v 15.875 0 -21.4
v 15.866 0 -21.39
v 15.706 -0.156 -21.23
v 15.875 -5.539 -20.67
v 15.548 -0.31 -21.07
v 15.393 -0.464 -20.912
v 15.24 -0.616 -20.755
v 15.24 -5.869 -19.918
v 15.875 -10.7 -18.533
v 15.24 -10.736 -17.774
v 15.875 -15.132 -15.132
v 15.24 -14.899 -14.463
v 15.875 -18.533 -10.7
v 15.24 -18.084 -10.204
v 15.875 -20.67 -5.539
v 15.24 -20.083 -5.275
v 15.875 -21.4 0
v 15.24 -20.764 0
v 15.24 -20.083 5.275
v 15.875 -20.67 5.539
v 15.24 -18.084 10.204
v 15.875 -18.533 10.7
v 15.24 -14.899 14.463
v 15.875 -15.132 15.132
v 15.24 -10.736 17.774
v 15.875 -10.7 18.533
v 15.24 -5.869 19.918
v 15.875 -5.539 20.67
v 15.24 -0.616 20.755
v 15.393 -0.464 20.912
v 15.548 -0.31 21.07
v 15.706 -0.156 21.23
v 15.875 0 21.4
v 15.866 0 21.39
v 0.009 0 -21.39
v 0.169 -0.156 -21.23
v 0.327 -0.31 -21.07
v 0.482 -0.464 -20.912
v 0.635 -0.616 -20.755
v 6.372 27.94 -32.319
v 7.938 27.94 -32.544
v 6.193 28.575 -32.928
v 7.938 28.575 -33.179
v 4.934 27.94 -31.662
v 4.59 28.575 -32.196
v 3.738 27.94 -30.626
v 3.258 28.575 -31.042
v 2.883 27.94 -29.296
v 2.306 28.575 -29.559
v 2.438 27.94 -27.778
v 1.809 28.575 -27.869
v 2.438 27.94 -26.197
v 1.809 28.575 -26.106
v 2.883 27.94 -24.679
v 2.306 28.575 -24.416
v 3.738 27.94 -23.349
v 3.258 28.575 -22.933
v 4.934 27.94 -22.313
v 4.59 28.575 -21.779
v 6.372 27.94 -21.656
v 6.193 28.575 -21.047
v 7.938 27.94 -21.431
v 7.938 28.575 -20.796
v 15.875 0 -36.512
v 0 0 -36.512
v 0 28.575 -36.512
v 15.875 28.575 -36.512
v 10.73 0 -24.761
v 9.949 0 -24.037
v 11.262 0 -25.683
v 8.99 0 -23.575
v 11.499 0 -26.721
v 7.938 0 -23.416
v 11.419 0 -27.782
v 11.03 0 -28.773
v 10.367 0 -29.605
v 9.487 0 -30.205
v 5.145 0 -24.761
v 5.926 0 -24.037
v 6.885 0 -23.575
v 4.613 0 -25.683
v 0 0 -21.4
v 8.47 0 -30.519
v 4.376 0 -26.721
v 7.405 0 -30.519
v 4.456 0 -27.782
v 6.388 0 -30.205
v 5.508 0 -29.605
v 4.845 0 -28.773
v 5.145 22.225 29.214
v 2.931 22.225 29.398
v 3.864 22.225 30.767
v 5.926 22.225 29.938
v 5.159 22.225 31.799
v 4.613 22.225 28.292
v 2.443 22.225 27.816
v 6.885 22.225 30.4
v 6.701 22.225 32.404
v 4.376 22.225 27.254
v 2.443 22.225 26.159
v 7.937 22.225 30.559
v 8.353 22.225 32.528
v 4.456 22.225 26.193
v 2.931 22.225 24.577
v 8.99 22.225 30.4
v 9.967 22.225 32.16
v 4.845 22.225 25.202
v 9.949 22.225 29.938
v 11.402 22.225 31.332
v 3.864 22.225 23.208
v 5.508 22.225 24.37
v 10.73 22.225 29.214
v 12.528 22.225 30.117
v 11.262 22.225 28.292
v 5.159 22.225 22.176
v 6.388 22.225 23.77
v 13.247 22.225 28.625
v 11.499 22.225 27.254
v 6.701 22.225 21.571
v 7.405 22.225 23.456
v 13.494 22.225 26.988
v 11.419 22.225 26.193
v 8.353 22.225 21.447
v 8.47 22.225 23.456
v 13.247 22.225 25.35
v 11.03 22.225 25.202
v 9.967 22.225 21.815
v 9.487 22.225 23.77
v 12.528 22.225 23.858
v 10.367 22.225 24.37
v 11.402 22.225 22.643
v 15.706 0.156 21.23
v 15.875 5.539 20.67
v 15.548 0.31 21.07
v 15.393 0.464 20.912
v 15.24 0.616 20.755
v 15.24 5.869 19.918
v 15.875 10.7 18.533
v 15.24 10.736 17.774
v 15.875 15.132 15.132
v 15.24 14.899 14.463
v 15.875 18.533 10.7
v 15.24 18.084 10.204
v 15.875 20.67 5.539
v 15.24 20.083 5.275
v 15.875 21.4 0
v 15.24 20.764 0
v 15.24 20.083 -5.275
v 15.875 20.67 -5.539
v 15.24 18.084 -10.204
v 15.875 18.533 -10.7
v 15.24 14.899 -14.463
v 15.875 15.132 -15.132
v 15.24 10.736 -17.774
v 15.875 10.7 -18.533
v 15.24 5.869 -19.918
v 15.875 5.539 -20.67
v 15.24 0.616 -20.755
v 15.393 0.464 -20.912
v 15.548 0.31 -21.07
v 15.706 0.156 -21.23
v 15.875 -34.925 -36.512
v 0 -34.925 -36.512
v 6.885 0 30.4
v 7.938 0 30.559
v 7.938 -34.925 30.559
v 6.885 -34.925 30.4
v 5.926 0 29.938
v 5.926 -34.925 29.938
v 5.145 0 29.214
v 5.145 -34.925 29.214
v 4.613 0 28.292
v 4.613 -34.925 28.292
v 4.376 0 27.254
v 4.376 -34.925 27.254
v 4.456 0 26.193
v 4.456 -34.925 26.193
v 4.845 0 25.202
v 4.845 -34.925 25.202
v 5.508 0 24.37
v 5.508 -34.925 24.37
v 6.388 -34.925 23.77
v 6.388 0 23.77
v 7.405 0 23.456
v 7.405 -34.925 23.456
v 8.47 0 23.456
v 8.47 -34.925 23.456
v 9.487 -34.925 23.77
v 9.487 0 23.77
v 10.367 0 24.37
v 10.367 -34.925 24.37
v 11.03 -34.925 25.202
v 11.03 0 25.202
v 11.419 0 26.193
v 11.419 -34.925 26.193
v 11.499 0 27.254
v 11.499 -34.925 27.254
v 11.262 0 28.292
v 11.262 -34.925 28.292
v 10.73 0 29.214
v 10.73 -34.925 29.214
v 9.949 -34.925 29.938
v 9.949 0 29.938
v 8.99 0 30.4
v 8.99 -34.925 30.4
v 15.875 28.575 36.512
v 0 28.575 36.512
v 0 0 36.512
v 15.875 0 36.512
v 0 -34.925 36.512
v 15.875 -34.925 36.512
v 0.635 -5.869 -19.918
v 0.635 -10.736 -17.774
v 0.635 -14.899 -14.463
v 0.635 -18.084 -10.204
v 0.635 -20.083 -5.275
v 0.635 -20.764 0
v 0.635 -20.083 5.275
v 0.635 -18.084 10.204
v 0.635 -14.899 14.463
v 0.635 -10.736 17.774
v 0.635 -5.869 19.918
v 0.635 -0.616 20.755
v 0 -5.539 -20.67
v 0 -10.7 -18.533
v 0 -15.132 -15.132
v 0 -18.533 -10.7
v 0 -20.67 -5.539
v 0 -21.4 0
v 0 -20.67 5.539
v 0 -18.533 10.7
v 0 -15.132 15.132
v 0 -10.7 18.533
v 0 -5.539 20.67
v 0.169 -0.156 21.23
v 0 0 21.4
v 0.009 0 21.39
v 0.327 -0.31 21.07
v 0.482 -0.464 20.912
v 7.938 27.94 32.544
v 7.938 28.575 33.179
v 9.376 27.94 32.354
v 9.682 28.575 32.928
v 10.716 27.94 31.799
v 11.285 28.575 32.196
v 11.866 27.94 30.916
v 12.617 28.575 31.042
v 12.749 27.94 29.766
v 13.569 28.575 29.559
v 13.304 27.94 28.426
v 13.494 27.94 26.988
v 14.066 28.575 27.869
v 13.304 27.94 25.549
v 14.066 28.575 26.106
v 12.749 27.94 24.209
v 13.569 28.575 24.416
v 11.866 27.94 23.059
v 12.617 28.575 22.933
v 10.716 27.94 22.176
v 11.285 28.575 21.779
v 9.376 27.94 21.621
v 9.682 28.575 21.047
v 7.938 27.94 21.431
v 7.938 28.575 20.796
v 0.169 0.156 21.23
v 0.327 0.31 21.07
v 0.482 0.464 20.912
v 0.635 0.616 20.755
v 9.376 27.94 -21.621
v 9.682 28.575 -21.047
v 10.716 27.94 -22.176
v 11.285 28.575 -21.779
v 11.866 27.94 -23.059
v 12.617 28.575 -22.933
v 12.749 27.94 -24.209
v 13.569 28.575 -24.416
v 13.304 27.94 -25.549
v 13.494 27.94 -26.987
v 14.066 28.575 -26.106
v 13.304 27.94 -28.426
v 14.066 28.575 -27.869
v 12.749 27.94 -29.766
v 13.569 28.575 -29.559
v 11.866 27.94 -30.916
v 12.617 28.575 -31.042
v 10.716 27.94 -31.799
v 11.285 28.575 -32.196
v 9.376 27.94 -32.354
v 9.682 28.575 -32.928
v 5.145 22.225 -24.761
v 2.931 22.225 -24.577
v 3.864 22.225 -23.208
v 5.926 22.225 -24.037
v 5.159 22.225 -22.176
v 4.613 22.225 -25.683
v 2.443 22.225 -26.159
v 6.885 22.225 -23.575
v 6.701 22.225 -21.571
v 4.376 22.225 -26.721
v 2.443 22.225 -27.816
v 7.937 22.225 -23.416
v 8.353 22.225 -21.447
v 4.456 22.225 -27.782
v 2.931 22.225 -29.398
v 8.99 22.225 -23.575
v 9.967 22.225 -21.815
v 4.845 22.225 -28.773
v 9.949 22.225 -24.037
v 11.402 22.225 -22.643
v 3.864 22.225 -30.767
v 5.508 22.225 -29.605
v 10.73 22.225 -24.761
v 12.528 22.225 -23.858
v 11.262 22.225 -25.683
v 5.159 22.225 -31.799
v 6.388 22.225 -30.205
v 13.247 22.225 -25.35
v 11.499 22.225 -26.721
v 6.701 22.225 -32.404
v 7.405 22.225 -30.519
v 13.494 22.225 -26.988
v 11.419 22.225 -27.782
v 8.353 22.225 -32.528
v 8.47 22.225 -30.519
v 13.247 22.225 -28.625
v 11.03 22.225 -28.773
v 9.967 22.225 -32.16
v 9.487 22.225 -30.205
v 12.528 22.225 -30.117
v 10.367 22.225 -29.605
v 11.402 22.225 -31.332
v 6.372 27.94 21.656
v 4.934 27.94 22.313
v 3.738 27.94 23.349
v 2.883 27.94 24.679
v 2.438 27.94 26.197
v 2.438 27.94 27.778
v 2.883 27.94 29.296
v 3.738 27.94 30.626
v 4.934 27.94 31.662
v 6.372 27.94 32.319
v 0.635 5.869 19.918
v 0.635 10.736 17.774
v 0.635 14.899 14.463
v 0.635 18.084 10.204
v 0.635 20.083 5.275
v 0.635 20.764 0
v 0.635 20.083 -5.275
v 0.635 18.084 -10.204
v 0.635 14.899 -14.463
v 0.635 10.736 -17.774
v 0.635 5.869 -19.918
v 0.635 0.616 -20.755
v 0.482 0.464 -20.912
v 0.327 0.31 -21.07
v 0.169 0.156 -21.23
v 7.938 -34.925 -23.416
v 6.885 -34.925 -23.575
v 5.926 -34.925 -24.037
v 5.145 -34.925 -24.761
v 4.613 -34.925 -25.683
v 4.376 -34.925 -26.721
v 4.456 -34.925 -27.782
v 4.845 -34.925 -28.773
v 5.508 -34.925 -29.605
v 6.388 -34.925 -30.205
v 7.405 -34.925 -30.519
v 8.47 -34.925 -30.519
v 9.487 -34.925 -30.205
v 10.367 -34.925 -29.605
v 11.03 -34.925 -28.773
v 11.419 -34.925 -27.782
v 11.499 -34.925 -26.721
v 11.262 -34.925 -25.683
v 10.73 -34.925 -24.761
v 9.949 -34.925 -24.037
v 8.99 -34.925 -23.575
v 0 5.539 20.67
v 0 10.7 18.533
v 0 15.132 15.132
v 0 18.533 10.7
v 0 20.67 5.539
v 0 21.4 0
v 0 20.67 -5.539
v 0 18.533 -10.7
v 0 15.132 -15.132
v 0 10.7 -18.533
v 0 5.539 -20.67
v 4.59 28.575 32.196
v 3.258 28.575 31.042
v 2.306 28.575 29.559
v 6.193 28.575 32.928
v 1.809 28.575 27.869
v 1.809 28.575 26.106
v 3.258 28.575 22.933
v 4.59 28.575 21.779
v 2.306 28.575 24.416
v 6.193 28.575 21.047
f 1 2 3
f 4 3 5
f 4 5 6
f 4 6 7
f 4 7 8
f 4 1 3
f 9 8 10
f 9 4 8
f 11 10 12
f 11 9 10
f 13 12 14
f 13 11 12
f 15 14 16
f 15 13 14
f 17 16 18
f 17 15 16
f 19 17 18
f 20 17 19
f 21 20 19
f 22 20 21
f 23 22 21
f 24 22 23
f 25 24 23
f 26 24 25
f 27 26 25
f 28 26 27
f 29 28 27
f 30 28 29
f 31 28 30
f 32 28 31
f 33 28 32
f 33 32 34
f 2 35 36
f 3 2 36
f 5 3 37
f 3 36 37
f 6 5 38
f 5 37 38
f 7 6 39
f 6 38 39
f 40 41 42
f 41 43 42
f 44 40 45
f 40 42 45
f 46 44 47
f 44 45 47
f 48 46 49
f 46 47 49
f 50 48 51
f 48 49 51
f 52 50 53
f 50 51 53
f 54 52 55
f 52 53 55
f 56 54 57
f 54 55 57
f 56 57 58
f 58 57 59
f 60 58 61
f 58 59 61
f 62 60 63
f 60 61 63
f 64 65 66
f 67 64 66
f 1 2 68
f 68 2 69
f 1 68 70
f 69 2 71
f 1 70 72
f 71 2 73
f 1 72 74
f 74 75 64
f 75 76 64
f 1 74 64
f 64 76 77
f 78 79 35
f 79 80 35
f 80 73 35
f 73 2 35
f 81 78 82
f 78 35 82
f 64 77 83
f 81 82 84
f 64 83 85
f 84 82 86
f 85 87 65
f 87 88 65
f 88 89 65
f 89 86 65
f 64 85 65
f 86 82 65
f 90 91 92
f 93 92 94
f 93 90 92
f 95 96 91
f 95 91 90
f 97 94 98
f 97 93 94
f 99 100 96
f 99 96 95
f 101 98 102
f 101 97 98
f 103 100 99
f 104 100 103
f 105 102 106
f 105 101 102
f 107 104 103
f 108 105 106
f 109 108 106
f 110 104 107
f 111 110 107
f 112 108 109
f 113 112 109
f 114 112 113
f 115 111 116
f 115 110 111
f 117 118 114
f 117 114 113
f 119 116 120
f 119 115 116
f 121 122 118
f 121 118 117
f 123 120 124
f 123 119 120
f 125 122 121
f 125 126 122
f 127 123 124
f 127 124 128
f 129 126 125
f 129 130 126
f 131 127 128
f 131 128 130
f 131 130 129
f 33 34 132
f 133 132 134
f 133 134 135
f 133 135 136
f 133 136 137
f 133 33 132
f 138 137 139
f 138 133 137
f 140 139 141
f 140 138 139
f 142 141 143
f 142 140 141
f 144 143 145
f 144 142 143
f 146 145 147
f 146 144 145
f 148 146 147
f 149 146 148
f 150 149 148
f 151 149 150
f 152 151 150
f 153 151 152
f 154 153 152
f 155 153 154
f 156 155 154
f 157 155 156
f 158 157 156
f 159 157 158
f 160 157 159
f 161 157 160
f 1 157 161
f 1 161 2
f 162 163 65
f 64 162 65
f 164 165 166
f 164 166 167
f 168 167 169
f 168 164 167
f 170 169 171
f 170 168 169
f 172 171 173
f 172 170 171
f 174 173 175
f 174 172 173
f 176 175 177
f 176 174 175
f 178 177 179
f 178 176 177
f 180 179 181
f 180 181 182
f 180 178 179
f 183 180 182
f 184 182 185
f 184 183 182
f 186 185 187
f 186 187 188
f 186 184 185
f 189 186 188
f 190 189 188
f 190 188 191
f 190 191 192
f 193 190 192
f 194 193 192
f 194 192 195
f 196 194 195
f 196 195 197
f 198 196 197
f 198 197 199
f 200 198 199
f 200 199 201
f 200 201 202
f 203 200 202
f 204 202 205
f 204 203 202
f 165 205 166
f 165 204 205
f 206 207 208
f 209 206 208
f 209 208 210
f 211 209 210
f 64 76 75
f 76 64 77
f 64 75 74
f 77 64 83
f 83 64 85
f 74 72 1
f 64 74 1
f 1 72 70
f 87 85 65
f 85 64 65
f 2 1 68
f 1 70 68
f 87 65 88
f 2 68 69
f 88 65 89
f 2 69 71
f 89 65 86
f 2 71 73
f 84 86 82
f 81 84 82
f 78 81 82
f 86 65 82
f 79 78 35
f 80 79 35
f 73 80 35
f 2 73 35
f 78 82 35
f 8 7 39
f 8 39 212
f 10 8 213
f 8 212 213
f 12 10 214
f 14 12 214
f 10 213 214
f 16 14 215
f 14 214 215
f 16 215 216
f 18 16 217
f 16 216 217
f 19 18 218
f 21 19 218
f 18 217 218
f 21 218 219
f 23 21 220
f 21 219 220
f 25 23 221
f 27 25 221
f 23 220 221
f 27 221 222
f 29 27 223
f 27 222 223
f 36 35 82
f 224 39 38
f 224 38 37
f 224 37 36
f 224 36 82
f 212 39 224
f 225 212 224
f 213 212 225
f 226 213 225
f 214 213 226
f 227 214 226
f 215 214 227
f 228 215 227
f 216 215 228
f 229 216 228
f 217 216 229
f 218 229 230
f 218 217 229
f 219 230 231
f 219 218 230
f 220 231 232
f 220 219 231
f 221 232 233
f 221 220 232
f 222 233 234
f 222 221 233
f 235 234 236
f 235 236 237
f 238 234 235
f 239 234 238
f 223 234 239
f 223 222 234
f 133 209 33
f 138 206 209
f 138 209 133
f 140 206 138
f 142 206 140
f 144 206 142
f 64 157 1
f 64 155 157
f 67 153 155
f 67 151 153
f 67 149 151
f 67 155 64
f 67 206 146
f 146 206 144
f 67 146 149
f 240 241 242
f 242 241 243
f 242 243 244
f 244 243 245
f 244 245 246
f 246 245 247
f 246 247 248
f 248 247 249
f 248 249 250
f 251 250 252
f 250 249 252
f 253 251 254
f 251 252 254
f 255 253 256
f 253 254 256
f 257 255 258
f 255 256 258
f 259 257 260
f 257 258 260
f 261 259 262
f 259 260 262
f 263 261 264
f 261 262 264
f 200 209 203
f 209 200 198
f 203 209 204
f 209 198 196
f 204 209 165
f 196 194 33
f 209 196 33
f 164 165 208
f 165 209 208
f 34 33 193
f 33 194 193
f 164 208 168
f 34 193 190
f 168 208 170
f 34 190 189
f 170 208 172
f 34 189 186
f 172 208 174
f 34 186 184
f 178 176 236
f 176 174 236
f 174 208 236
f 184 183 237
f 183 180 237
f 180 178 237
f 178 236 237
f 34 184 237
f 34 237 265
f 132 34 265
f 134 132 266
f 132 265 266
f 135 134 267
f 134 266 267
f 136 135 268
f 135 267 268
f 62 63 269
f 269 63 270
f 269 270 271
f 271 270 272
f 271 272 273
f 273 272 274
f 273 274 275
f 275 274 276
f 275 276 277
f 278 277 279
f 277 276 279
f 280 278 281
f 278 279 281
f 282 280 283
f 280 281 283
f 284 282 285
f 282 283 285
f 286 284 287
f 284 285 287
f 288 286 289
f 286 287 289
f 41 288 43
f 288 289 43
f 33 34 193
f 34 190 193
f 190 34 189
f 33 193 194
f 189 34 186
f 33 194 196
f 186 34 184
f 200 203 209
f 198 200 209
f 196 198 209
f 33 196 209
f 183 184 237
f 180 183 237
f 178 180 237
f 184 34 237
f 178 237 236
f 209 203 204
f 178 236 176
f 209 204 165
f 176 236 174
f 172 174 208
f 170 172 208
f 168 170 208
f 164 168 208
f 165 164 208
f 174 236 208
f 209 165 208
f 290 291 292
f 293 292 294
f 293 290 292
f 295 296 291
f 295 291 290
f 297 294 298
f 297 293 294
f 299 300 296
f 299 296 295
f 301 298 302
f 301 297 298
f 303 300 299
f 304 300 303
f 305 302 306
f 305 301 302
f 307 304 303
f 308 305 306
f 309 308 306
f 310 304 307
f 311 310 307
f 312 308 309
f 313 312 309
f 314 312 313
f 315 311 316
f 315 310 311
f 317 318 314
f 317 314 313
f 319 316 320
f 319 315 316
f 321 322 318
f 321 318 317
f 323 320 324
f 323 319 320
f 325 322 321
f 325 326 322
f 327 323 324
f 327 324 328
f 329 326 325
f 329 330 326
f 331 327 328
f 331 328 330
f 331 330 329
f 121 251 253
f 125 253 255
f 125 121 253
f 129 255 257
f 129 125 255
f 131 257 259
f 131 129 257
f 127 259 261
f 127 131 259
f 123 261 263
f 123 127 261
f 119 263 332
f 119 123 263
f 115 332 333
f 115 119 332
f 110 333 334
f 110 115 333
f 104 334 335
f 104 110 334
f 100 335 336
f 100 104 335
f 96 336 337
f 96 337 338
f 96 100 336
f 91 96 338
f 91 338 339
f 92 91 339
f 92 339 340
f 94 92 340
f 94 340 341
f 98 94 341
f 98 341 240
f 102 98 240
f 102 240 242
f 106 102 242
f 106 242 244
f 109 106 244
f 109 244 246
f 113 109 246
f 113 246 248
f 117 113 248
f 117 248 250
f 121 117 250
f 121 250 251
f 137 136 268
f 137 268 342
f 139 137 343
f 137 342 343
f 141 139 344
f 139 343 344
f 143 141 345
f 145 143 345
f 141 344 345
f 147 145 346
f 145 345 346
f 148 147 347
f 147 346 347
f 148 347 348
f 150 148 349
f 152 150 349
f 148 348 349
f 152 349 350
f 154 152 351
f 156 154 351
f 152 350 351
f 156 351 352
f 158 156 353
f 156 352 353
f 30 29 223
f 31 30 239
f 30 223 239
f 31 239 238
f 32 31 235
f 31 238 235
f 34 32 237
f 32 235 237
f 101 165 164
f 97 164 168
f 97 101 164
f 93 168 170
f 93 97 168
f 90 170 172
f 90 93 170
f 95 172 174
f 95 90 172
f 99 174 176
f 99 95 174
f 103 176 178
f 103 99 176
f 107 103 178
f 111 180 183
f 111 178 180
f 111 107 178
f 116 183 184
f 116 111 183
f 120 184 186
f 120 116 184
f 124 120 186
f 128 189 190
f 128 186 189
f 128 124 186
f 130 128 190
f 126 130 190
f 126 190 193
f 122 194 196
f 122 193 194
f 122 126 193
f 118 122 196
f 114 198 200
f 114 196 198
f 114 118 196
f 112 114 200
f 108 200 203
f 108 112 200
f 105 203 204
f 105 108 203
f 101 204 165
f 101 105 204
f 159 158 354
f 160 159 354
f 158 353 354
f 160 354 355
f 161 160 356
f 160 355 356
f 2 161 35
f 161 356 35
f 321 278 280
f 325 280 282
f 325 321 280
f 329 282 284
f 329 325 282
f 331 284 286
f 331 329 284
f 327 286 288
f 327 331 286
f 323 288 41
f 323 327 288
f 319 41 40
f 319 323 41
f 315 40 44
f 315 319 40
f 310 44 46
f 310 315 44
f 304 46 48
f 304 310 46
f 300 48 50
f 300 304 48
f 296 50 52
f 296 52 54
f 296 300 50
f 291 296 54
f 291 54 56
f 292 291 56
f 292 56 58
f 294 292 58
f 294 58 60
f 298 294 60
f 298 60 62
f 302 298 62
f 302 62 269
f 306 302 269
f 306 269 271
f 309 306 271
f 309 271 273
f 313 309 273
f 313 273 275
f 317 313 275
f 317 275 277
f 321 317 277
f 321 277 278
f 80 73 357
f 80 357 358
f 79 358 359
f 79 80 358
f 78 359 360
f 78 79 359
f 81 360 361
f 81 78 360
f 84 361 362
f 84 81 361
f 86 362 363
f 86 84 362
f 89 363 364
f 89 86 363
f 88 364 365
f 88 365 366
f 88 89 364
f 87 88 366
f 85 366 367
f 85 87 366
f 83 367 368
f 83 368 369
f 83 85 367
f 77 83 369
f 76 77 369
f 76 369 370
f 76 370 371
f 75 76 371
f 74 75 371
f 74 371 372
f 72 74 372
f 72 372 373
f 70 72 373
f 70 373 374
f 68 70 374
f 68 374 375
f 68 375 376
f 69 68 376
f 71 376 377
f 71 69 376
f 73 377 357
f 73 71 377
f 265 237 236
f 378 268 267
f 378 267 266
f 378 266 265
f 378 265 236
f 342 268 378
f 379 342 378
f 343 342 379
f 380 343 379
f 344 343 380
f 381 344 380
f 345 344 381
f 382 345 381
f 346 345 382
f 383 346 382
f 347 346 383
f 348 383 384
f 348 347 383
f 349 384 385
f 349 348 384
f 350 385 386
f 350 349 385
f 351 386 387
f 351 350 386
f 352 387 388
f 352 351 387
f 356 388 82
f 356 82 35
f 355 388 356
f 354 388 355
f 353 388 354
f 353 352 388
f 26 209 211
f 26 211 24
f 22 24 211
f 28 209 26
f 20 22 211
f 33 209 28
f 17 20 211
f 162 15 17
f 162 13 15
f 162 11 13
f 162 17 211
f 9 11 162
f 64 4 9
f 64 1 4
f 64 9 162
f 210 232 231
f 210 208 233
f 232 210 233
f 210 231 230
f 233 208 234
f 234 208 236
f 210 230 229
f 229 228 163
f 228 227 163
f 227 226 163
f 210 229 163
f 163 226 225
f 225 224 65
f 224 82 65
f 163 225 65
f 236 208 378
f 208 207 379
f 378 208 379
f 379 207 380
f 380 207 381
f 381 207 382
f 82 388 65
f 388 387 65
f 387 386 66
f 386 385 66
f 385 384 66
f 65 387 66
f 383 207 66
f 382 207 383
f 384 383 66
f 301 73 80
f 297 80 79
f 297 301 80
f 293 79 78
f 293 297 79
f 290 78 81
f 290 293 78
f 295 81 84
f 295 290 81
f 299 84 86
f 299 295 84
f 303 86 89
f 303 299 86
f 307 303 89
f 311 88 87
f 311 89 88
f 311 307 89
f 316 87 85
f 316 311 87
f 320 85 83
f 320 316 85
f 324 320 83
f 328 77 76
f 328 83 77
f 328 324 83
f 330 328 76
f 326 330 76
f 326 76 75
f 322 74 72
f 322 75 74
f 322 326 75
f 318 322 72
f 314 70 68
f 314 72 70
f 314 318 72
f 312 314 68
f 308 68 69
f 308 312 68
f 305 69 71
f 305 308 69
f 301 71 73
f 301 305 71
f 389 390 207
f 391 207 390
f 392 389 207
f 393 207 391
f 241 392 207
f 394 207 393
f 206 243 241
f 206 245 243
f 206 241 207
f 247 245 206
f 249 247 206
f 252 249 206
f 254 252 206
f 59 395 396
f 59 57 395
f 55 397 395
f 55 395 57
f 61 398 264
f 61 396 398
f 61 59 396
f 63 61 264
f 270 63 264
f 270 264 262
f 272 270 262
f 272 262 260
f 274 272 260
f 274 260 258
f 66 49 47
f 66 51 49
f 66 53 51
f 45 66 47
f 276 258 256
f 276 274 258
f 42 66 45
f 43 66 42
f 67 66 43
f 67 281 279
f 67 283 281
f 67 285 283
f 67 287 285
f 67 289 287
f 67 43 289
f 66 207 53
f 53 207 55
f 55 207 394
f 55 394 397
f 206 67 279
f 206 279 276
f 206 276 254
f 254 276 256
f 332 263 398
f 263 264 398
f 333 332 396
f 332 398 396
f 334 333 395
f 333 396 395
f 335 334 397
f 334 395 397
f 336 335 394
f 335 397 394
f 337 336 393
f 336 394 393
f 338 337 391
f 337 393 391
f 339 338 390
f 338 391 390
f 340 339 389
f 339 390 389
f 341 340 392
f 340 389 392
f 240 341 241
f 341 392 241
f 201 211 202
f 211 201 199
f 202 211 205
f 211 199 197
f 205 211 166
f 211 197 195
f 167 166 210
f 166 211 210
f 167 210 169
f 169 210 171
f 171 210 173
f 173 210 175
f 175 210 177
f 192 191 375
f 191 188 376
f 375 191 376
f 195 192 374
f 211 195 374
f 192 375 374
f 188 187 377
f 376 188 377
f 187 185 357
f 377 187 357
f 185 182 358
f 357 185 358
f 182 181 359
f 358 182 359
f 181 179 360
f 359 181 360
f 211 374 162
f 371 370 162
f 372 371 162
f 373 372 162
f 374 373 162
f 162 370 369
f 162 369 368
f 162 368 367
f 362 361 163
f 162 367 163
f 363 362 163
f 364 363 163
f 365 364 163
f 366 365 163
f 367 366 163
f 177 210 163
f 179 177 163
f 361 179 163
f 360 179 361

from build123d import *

# Parameters (mm, degrees)
BOSS_EXTRUDE1_DEPTH                           = 15.875
BOSS_EXTRUDE2_DEPTH                           = 15.875
CBORE_FOR_1_4_SOCKET_HEAD_CAP_SCREW1_AT_COUNT = 2
CBORE_FOR_1_4_SOCKET_HEAD_CAP_SCREW1_AT_PITCH = 53.975
MOVE_FACE1_BY                                 = 0.127
MOVE_FACE1_2_BY                               = 0.127
MOVE_START                                    = 28.575
MOVE_FACE2_OUTLINE_W                          = 15.875
MOVE_FACE2_OUTLINE_H                          = 73.025
MOVE_FACE2_OUTLINE_R                          = 5.55625
MOVE_FACE2_DEPTH                              = 6.35
MOVE_START_2                                  = 22.225
MOVE_FACE2_2_OUTLINE_R                        = 5.55625
MOVE_FACE2_2_OUTLINE_R_2                      = 3.57124
MOVE_FACE2_2_DEPTH                            = 6.35


with BuildPart() as part:
    # Sketch1 → Boss-Extrude1 (new body)
    with BuildSketch(Plane(origin=(0, 0, 0), x_dir=(0, 0, -1), z_dir=(1, 0, 0))):
        with BuildLine():
            Line((36.5125, 0), (20.6375, 0))
            ThreePointArc((20.6375, 0), (0, -20.6375), (-20.6375, 0))
            Line((-20.6375, 0), (-36.5125, 0))
            Line((-36.5125, 0), (-36.5125, -34.925))
            Line((-36.5125, -34.925), (36.5125, -34.925))
            Line((36.5125, -34.925), (36.5125, 0))
        make_face()
    extrude(amount=BOSS_EXTRUDE1_DEPTH)


with BuildPart() as body_2:
    # Sketch1<3> → Boss-Extrude2 (new body)
    with BuildSketch(Plane(origin=(0, 0, 0), x_dir=(0, 0, -1), z_dir=(1, 0, 0))):
        with BuildLine():
            ThreePointArc((-20.6375, 0), (0, 20.6375), (20.6375, 0))
            Line((20.6375, 0), (36.5125, 0))
            Line((36.5125, 0), (36.5125, 34.925))
            Line((36.5125, 34.925), (-36.5125, 34.925))
            Line((-36.5125, 34.925), (-36.5125, 0))
            Line((-36.5125, 0), (-20.6375, 0))
        make_face()
    extrude(amount=BOSS_EXTRUDE2_DEPTH)


with BuildPart() as cbore_for_1_4_socket_head_cap_screw1_tool:
    # Sketch4 → CBORE for 1/4 Socket Head Cap Screw1 (revolve)
    with BuildSketch(Plane(origin=(7.9375, 34.925, 26.9875), x_dir=(0, 0, 1), z_dir=(1, 0, 0))):
        Polygon((0, 0), (0, 69.85), (3.57124, 69.85), (3.57124, 6.35), (5.55625, 6.35), (5.55625, 0.635), (6.19125, 0), align=None)
    cbore_for_1_4_socket_head_cap_screw1 = revolve(axis=Axis((7.9375, 41.275, 26.9875), (0, -1, 0)))


with BuildPart() as part_1:
    add(part.part)

    # CBORE for 1/4 Socket Head Cap Screw1: cut by cbore_for_1_4_socket_head_cap_screw1_tool
    add(cbore_for_1_4_socket_head_cap_screw1_tool.part, mode=Mode.SUBTRACT)


with BuildPart() as body_2_1:
    add(body_2.part)

    # CBORE for 1/4 Socket Head Cap Screw1: cut by cbore_for_1_4_socket_head_cap_screw1_tool
    add(cbore_for_1_4_socket_head_cap_screw1_tool.part, mode=Mode.SUBTRACT)


with BuildPart() as cbore_for_1_4_socket_head_cap_screw1_at_tool:
    # CBORE for 1/4 Socket Head Cap Screw1 at: CBORE for 1/4 Socket Head Cap Screw1 ×2
    with Locations(*[(0, 0, -i * CBORE_FOR_1_4_SOCKET_HEAD_CAP_SCREW1_AT_PITCH) for i in range(1, CBORE_FOR_1_4_SOCKET_HEAD_CAP_SCREW1_AT_COUNT)]):
        add(cbore_for_1_4_socket_head_cap_screw1)


with BuildPart() as part_2:
    add(part_1.part)

    # CBORE for 1/4 Socket Head Cap Screw1 at: cut by cbore_for_1_4_socket_head_cap_screw1_at_tool
    add(cbore_for_1_4_socket_head_cap_screw1_at_tool.part, mode=Mode.SUBTRACT)

    # Move Face1 2: a curved face moved inward by 0.127
    add(Solid.thicken(part_2.faces().sort_by_distance((7.9375, -20.6375, 0))[0], -MOVE_FACE1_2_BY), mode=Mode.SUBTRACT)

    # Chamfer2
    # the kernel refuses this chamfer: 0.635 mm, written as the material it takes off along each edge
    with BuildSketch(Plane(origin=(0, 0, 0), x_dir=(0, 0.07868977926472538, -0.9968991516895122), z_dir=(0, 0.9968991516895122, 0.07868977926472538))) as chamfer2_piece_1:
        with BuildLine():
            Line((21.417460512, 0.017960512), (20.746539488, -0.652960512))
            Line((20.746539488, -0.652960512), (20.733839488, -0.652960512))
            ThreePointArc((20.733839488, -0.652960512), (20.7518, -0.326480256), (20.7518, 0))
            Line((20.7518, 0), (20.7645, 0.0127))
            ThreePointArc((20.7645, 0.0127), (21.090980256, 0.0127), (21.417460512, 0.030660512))
            Line((21.417460512, 0.030660512), (21.417460512, 0.017960512))
        make_face()
    revolve(axis=Axis((0, 0, 0), (-1, 0, 0)), revolution_arc=189.026516368, mode=Mode.SUBTRACT)
    with BuildSketch(Plane(origin=(-1.610111621, 0, -20.7645), x_dir=(0, 0, -1), z_dir=(1, 0, 0))) as chamfer2_piece_2:
        with BuildLine():
            Line((0.643801601, 0.017692029), (-0.027368853, -0.633849299))
            Line((-0.027368853, -0.633849299), (-0.040063261, -0.633472445))
            ThreePointArc((-0.040063261, -0.633472445), (-0.015119867, -0.316902726), (-0.0127, 0))
            Line((-0.0127, 0), (0, 0.0127))
            ThreePointArc((0, 0.0127), (0.3219008, 0.0127), (0.643801601, 0.030392029))
            Line((0.643801601, 0.030392029), (0.643801601, 0.017692029))
        make_face()
    extrude(amount=19.095223242, mode=Mode.SUBTRACT)
    with BuildSketch(Plane(origin=(-1.610111621, 0, 20.7645), x_dir=(0, -0.9998899044534173, -0.01483842889716635), z_dir=(1, 0, 0))) as chamfer2_piece_3:
        with BuildLine():
            Line((0.634185626, 0.017960512), (-0.027243086, -0.643468199))
            Line((-0.027243086, -0.643468199), (-0.039941687, -0.643279751))
            ThreePointArc((-0.039941687, -0.643279751), (-0.017475104, -0.321676913), (-0.012698602, 0.000188448))
            Line((-0.012698602, 0.000188448), (0.000188448, 0.012698602))
            ThreePointArc((0.000188448, 0.012698602), (0.317092192, 0.010415864), (0.633997178, 0.030659114))
            Line((0.633997178, 0.030659114), (0.634185626, 0.017960512))
        make_face()
    extrude(amount=19.095223242, mode=Mode.SUBTRACT)
    with BuildSketch(Plane(origin=(15.875, 0, 0), x_dir=(0, 0.0786897792647254, -0.9968991516895122), z_dir=(0, 0.9968991516895122, 0.0786897792647254))) as chamfer2_piece_4:
        with BuildLine():
            Line((20.746539488, 0.652960512), (21.417460512, -0.017960512))
            Line((21.417460512, -0.017960512), (21.417460512, -0.030660512))
            ThreePointArc((21.417460512, -0.030660512), (21.090980256, -0.0127), (20.7645, -0.0127))
            Line((20.7645, -0.0127), (20.7518, 0))
            ThreePointArc((20.7518, 0), (20.7518, 0.326480256), (20.733839488, 0.652960512))
            Line((20.733839488, 0.652960512), (20.746539488, 0.652960512))
        make_face()
    revolve(axis=Axis((15.875, 0, 0), (-1, 0, 0)), revolution_arc=189.026516368, mode=Mode.SUBTRACT)


with BuildPart() as body_2_2:
    add(body_2_1.part)

    # CBORE for 1/4 Socket Head Cap Screw1 at: cut by cbore_for_1_4_socket_head_cap_screw1_at_tool
    add(cbore_for_1_4_socket_head_cap_screw1_at_tool.part, mode=Mode.SUBTRACT)

    # Move Face1: a curved face moved inward by 0.127
    add(Solid.thicken(body_2_2.faces().sort_by_distance((7.9375, 20.6375, 0))[0], -MOVE_FACE1_BY), mode=Mode.SUBTRACT)

    # Move Face2: read off the stored shape, not the designer's step
    # Move Face2 outline → Move Face2 (cut)
    with BuildSketch(Plane(origin=(0, 0, 0), x_dir=(1, 0, 0), z_dir=(0, 1, 0)).offset(MOVE_START)):
        with Locations((7.9375, 0)):
            Rectangle(MOVE_FACE2_OUTLINE_W, MOVE_FACE2_OUTLINE_H)
        with Locations((7.9375, -26.9875)):
            Circle(MOVE_FACE2_OUTLINE_R, mode=Mode.SUBTRACT)
        with Locations((7.9375, 26.9875)):
            Circle(MOVE_FACE2_OUTLINE_R, mode=Mode.SUBTRACT)
    extrude(amount=MOVE_FACE2_DEPTH, mode=Mode.SUBTRACT)

    # Move Face2 2 outline → Move Face2 2 (cut)
    # profile 1 of 2: a face of its own
    with BuildSketch(Plane(origin=(0, 0, 0), x_dir=(1, 0, 0), z_dir=(0, 1, 0)).offset(MOVE_START_2)):
        with Locations((7.9375, 26.9875)):
            Circle(MOVE_FACE2_2_OUTLINE_R)
        with Locations((7.9375, 26.9875)):
            Circle(MOVE_FACE2_2_OUTLINE_R_2, mode=Mode.SUBTRACT)
    # profile 2 of 2: a face of its own
    with BuildSketch(Plane(origin=(0, 0, 0), x_dir=(1, 0, 0), z_dir=(0, 1, 0)).offset(MOVE_START_2)):
        with Locations((7.9375, -26.9875)):
            Circle(MOVE_FACE2_2_OUTLINE_R)
        with Locations((7.9375, -26.9875)):
            Circle(MOVE_FACE2_2_OUTLINE_R_2, mode=Mode.SUBTRACT)
    extrude(amount=MOVE_FACE2_2_DEPTH, mode=Mode.SUBTRACT)

    # Move Face2 3: loft between two sections, ruled curve by curve
    move_face2_3_from = [
        Edge.make_three_point_arc((7.9375, 27.94, -21.43125), (13.49375, 27.94, -26.9875), (7.9375, 27.94, -32.54375)),
        Edge.make_three_point_arc((7.9375, 27.94, -32.54375), (2.38125, 27.94, -26.9875), (7.9375, 27.94, -21.43125)),
    ]
    move_face2_3_to = [
        Edge.make_three_point_arc((7.9375, 28.575, -20.79625), (14.12875, 28.575, -26.9875), (7.9375, 28.575, -33.17875)),
        Edge.make_three_point_arc((7.9375, 28.575, -33.17875), (1.74625, 28.575, -26.9875), (7.9375, 28.575, -20.79625)),
    ]
    move_face2_3 = Solid(Shell([*[Face.make_surface_from_curves(move_face2_3_from[k], move_face2_3_to[k]) for k in range(2)], Face(Wire(move_face2_3_from)), Face(Wire(move_face2_3_to))]))
    add(move_face2_3, mode=Mode.SUBTRACT)

    # Move Face2 4: loft between two sections, ruled curve by curve
    move_face2_4_from = [
        Edge.make_three_point_arc((7.9375, 27.94, 32.54375), (13.49375, 27.94, 26.9875), (7.9375, 27.94, 21.43125)),
        Edge.make_three_point_arc((7.9375, 27.94, 21.43125), (2.38125, 27.94, 26.9875), (7.9375, 27.94, 32.54375)),
    ]
    move_face2_4_to = [
        Edge.make_three_point_arc((7.9375, 28.575, 33.17875), (14.12875, 28.575, 26.9875), (7.9375, 28.575, 20.79625)),
        Edge.make_three_point_arc((7.9375, 28.575, 20.79625), (1.74625, 28.575, 26.9875), (7.9375, 28.575, 33.17875)),
    ]
    move_face2_4 = Solid(Shell([*[Face.make_surface_from_curves(move_face2_4_from[k], move_face2_4_to[k]) for k in range(2)], Face(Wire(move_face2_4_from)), Face(Wire(move_face2_4_to))]))
    add(move_face2_4, mode=Mode.SUBTRACT)

    # Chamfer1
    # the kernel refuses this chamfer: 0.635 mm, written as the material it takes off along each edge
    with BuildSketch(Plane(origin=(0, 0, 0), x_dir=(0, -0.0786897792647251, 0.9968991516895122), z_dir=(0, -0.9968991516895122, -0.0786897792647251))) as chamfer1_piece_1:
        with BuildLine():
            Line((21.417460512, 0.017960512), (20.746539488, -0.652960512))
            Line((20.746539488, -0.652960512), (20.733839488, -0.652960512))
            ThreePointArc((20.733839488, -0.652960512), (20.7518, -0.326480256), (20.7518, 0))
            Line((20.7518, 0), (20.7645, 0.0127))
            ThreePointArc((20.7645, 0.0127), (21.090980256, 0.0127), (21.417460512, 0.030660512))
            Line((21.417460512, 0.030660512), (21.417460512, 0.017960512))
        make_face()
    revolve(axis=Axis((0, 0, 0), (-1, 0, 0)), revolution_arc=189.026516368, mode=Mode.SUBTRACT)
    with BuildSketch(Plane(origin=(-1.610111621, 0, 20.7645), x_dir=(0, 0, 1), z_dir=(1, 0, 0))) as chamfer1_piece_2:
        with BuildLine():
            Line((0.643801601, 0.017692029), (-0.027368853, -0.633849299))
            Line((-0.027368853, -0.633849299), (-0.040063261, -0.633472445))
            ThreePointArc((-0.040063261, -0.633472445), (-0.015119867, -0.316902726), (-0.0127, 0))
            Line((-0.0127, 0), (0, 0.0127))
            ThreePointArc((0, 0.0127), (0.3219008, 0.0127), (0.643801601, 0.030392029))
            Line((0.643801601, 0.030392029), (0.643801601, 0.017692029))
        make_face()
    extrude(amount=19.095223242, mode=Mode.SUBTRACT)
    with BuildSketch(Plane(origin=(-1.610111621, 0, -20.7645), x_dir=(0, 0.9998899044534173, 0.014838428897166573), z_dir=(1, 0, 0))) as chamfer1_piece_3:
        with BuildLine():
            Line((0.634185626, 0.017960512), (-0.027243086, -0.643468199))
            Line((-0.027243086, -0.643468199), (-0.039941687, -0.643279751))
            ThreePointArc((-0.039941687, -0.643279751), (-0.017475104, -0.321676913), (-0.012698602, 0.000188448))
            Line((-0.012698602, 0.000188448), (0.000188448, 0.012698602))
            ThreePointArc((0.000188448, 0.012698602), (0.317092192, 0.010415864), (0.633997178, 0.030659114))
            Line((0.633997178, 0.030659114), (0.634185626, 0.017960512))
        make_face()
    extrude(amount=19.095223242, mode=Mode.SUBTRACT)
    with BuildSketch(Plane(origin=(15.875, 0, 0), x_dir=(0, -0.07868977926472513, 0.9968991516895122), z_dir=(0, -0.9968991516895122, -0.07868977926472513))) as chamfer1_piece_4:
        with BuildLine():
            Line((20.746539488, 0.652960512), (21.417460512, -0.017960512))
            Line((21.417460512, -0.017960512), (21.417460512, -0.030660512))
            ThreePointArc((21.417460512, -0.030660512), (21.090980256, -0.0127), (20.7645, -0.0127))
            Line((20.7645, -0.0127), (20.7518, 0))
            ThreePointArc((20.7518, 0), (20.7518, 0.326480256), (20.733839488, 0.652960512))
            Line((20.733839488, 0.652960512), (20.746539488, 0.652960512))
        make_face()
    revolve(axis=Axis((15.875, 0, 0), (-1, 0, 0)), revolution_arc=189.026516368, mode=Mode.SUBTRACT)


solid = Compound([part_2.part, body_2_2.part])
